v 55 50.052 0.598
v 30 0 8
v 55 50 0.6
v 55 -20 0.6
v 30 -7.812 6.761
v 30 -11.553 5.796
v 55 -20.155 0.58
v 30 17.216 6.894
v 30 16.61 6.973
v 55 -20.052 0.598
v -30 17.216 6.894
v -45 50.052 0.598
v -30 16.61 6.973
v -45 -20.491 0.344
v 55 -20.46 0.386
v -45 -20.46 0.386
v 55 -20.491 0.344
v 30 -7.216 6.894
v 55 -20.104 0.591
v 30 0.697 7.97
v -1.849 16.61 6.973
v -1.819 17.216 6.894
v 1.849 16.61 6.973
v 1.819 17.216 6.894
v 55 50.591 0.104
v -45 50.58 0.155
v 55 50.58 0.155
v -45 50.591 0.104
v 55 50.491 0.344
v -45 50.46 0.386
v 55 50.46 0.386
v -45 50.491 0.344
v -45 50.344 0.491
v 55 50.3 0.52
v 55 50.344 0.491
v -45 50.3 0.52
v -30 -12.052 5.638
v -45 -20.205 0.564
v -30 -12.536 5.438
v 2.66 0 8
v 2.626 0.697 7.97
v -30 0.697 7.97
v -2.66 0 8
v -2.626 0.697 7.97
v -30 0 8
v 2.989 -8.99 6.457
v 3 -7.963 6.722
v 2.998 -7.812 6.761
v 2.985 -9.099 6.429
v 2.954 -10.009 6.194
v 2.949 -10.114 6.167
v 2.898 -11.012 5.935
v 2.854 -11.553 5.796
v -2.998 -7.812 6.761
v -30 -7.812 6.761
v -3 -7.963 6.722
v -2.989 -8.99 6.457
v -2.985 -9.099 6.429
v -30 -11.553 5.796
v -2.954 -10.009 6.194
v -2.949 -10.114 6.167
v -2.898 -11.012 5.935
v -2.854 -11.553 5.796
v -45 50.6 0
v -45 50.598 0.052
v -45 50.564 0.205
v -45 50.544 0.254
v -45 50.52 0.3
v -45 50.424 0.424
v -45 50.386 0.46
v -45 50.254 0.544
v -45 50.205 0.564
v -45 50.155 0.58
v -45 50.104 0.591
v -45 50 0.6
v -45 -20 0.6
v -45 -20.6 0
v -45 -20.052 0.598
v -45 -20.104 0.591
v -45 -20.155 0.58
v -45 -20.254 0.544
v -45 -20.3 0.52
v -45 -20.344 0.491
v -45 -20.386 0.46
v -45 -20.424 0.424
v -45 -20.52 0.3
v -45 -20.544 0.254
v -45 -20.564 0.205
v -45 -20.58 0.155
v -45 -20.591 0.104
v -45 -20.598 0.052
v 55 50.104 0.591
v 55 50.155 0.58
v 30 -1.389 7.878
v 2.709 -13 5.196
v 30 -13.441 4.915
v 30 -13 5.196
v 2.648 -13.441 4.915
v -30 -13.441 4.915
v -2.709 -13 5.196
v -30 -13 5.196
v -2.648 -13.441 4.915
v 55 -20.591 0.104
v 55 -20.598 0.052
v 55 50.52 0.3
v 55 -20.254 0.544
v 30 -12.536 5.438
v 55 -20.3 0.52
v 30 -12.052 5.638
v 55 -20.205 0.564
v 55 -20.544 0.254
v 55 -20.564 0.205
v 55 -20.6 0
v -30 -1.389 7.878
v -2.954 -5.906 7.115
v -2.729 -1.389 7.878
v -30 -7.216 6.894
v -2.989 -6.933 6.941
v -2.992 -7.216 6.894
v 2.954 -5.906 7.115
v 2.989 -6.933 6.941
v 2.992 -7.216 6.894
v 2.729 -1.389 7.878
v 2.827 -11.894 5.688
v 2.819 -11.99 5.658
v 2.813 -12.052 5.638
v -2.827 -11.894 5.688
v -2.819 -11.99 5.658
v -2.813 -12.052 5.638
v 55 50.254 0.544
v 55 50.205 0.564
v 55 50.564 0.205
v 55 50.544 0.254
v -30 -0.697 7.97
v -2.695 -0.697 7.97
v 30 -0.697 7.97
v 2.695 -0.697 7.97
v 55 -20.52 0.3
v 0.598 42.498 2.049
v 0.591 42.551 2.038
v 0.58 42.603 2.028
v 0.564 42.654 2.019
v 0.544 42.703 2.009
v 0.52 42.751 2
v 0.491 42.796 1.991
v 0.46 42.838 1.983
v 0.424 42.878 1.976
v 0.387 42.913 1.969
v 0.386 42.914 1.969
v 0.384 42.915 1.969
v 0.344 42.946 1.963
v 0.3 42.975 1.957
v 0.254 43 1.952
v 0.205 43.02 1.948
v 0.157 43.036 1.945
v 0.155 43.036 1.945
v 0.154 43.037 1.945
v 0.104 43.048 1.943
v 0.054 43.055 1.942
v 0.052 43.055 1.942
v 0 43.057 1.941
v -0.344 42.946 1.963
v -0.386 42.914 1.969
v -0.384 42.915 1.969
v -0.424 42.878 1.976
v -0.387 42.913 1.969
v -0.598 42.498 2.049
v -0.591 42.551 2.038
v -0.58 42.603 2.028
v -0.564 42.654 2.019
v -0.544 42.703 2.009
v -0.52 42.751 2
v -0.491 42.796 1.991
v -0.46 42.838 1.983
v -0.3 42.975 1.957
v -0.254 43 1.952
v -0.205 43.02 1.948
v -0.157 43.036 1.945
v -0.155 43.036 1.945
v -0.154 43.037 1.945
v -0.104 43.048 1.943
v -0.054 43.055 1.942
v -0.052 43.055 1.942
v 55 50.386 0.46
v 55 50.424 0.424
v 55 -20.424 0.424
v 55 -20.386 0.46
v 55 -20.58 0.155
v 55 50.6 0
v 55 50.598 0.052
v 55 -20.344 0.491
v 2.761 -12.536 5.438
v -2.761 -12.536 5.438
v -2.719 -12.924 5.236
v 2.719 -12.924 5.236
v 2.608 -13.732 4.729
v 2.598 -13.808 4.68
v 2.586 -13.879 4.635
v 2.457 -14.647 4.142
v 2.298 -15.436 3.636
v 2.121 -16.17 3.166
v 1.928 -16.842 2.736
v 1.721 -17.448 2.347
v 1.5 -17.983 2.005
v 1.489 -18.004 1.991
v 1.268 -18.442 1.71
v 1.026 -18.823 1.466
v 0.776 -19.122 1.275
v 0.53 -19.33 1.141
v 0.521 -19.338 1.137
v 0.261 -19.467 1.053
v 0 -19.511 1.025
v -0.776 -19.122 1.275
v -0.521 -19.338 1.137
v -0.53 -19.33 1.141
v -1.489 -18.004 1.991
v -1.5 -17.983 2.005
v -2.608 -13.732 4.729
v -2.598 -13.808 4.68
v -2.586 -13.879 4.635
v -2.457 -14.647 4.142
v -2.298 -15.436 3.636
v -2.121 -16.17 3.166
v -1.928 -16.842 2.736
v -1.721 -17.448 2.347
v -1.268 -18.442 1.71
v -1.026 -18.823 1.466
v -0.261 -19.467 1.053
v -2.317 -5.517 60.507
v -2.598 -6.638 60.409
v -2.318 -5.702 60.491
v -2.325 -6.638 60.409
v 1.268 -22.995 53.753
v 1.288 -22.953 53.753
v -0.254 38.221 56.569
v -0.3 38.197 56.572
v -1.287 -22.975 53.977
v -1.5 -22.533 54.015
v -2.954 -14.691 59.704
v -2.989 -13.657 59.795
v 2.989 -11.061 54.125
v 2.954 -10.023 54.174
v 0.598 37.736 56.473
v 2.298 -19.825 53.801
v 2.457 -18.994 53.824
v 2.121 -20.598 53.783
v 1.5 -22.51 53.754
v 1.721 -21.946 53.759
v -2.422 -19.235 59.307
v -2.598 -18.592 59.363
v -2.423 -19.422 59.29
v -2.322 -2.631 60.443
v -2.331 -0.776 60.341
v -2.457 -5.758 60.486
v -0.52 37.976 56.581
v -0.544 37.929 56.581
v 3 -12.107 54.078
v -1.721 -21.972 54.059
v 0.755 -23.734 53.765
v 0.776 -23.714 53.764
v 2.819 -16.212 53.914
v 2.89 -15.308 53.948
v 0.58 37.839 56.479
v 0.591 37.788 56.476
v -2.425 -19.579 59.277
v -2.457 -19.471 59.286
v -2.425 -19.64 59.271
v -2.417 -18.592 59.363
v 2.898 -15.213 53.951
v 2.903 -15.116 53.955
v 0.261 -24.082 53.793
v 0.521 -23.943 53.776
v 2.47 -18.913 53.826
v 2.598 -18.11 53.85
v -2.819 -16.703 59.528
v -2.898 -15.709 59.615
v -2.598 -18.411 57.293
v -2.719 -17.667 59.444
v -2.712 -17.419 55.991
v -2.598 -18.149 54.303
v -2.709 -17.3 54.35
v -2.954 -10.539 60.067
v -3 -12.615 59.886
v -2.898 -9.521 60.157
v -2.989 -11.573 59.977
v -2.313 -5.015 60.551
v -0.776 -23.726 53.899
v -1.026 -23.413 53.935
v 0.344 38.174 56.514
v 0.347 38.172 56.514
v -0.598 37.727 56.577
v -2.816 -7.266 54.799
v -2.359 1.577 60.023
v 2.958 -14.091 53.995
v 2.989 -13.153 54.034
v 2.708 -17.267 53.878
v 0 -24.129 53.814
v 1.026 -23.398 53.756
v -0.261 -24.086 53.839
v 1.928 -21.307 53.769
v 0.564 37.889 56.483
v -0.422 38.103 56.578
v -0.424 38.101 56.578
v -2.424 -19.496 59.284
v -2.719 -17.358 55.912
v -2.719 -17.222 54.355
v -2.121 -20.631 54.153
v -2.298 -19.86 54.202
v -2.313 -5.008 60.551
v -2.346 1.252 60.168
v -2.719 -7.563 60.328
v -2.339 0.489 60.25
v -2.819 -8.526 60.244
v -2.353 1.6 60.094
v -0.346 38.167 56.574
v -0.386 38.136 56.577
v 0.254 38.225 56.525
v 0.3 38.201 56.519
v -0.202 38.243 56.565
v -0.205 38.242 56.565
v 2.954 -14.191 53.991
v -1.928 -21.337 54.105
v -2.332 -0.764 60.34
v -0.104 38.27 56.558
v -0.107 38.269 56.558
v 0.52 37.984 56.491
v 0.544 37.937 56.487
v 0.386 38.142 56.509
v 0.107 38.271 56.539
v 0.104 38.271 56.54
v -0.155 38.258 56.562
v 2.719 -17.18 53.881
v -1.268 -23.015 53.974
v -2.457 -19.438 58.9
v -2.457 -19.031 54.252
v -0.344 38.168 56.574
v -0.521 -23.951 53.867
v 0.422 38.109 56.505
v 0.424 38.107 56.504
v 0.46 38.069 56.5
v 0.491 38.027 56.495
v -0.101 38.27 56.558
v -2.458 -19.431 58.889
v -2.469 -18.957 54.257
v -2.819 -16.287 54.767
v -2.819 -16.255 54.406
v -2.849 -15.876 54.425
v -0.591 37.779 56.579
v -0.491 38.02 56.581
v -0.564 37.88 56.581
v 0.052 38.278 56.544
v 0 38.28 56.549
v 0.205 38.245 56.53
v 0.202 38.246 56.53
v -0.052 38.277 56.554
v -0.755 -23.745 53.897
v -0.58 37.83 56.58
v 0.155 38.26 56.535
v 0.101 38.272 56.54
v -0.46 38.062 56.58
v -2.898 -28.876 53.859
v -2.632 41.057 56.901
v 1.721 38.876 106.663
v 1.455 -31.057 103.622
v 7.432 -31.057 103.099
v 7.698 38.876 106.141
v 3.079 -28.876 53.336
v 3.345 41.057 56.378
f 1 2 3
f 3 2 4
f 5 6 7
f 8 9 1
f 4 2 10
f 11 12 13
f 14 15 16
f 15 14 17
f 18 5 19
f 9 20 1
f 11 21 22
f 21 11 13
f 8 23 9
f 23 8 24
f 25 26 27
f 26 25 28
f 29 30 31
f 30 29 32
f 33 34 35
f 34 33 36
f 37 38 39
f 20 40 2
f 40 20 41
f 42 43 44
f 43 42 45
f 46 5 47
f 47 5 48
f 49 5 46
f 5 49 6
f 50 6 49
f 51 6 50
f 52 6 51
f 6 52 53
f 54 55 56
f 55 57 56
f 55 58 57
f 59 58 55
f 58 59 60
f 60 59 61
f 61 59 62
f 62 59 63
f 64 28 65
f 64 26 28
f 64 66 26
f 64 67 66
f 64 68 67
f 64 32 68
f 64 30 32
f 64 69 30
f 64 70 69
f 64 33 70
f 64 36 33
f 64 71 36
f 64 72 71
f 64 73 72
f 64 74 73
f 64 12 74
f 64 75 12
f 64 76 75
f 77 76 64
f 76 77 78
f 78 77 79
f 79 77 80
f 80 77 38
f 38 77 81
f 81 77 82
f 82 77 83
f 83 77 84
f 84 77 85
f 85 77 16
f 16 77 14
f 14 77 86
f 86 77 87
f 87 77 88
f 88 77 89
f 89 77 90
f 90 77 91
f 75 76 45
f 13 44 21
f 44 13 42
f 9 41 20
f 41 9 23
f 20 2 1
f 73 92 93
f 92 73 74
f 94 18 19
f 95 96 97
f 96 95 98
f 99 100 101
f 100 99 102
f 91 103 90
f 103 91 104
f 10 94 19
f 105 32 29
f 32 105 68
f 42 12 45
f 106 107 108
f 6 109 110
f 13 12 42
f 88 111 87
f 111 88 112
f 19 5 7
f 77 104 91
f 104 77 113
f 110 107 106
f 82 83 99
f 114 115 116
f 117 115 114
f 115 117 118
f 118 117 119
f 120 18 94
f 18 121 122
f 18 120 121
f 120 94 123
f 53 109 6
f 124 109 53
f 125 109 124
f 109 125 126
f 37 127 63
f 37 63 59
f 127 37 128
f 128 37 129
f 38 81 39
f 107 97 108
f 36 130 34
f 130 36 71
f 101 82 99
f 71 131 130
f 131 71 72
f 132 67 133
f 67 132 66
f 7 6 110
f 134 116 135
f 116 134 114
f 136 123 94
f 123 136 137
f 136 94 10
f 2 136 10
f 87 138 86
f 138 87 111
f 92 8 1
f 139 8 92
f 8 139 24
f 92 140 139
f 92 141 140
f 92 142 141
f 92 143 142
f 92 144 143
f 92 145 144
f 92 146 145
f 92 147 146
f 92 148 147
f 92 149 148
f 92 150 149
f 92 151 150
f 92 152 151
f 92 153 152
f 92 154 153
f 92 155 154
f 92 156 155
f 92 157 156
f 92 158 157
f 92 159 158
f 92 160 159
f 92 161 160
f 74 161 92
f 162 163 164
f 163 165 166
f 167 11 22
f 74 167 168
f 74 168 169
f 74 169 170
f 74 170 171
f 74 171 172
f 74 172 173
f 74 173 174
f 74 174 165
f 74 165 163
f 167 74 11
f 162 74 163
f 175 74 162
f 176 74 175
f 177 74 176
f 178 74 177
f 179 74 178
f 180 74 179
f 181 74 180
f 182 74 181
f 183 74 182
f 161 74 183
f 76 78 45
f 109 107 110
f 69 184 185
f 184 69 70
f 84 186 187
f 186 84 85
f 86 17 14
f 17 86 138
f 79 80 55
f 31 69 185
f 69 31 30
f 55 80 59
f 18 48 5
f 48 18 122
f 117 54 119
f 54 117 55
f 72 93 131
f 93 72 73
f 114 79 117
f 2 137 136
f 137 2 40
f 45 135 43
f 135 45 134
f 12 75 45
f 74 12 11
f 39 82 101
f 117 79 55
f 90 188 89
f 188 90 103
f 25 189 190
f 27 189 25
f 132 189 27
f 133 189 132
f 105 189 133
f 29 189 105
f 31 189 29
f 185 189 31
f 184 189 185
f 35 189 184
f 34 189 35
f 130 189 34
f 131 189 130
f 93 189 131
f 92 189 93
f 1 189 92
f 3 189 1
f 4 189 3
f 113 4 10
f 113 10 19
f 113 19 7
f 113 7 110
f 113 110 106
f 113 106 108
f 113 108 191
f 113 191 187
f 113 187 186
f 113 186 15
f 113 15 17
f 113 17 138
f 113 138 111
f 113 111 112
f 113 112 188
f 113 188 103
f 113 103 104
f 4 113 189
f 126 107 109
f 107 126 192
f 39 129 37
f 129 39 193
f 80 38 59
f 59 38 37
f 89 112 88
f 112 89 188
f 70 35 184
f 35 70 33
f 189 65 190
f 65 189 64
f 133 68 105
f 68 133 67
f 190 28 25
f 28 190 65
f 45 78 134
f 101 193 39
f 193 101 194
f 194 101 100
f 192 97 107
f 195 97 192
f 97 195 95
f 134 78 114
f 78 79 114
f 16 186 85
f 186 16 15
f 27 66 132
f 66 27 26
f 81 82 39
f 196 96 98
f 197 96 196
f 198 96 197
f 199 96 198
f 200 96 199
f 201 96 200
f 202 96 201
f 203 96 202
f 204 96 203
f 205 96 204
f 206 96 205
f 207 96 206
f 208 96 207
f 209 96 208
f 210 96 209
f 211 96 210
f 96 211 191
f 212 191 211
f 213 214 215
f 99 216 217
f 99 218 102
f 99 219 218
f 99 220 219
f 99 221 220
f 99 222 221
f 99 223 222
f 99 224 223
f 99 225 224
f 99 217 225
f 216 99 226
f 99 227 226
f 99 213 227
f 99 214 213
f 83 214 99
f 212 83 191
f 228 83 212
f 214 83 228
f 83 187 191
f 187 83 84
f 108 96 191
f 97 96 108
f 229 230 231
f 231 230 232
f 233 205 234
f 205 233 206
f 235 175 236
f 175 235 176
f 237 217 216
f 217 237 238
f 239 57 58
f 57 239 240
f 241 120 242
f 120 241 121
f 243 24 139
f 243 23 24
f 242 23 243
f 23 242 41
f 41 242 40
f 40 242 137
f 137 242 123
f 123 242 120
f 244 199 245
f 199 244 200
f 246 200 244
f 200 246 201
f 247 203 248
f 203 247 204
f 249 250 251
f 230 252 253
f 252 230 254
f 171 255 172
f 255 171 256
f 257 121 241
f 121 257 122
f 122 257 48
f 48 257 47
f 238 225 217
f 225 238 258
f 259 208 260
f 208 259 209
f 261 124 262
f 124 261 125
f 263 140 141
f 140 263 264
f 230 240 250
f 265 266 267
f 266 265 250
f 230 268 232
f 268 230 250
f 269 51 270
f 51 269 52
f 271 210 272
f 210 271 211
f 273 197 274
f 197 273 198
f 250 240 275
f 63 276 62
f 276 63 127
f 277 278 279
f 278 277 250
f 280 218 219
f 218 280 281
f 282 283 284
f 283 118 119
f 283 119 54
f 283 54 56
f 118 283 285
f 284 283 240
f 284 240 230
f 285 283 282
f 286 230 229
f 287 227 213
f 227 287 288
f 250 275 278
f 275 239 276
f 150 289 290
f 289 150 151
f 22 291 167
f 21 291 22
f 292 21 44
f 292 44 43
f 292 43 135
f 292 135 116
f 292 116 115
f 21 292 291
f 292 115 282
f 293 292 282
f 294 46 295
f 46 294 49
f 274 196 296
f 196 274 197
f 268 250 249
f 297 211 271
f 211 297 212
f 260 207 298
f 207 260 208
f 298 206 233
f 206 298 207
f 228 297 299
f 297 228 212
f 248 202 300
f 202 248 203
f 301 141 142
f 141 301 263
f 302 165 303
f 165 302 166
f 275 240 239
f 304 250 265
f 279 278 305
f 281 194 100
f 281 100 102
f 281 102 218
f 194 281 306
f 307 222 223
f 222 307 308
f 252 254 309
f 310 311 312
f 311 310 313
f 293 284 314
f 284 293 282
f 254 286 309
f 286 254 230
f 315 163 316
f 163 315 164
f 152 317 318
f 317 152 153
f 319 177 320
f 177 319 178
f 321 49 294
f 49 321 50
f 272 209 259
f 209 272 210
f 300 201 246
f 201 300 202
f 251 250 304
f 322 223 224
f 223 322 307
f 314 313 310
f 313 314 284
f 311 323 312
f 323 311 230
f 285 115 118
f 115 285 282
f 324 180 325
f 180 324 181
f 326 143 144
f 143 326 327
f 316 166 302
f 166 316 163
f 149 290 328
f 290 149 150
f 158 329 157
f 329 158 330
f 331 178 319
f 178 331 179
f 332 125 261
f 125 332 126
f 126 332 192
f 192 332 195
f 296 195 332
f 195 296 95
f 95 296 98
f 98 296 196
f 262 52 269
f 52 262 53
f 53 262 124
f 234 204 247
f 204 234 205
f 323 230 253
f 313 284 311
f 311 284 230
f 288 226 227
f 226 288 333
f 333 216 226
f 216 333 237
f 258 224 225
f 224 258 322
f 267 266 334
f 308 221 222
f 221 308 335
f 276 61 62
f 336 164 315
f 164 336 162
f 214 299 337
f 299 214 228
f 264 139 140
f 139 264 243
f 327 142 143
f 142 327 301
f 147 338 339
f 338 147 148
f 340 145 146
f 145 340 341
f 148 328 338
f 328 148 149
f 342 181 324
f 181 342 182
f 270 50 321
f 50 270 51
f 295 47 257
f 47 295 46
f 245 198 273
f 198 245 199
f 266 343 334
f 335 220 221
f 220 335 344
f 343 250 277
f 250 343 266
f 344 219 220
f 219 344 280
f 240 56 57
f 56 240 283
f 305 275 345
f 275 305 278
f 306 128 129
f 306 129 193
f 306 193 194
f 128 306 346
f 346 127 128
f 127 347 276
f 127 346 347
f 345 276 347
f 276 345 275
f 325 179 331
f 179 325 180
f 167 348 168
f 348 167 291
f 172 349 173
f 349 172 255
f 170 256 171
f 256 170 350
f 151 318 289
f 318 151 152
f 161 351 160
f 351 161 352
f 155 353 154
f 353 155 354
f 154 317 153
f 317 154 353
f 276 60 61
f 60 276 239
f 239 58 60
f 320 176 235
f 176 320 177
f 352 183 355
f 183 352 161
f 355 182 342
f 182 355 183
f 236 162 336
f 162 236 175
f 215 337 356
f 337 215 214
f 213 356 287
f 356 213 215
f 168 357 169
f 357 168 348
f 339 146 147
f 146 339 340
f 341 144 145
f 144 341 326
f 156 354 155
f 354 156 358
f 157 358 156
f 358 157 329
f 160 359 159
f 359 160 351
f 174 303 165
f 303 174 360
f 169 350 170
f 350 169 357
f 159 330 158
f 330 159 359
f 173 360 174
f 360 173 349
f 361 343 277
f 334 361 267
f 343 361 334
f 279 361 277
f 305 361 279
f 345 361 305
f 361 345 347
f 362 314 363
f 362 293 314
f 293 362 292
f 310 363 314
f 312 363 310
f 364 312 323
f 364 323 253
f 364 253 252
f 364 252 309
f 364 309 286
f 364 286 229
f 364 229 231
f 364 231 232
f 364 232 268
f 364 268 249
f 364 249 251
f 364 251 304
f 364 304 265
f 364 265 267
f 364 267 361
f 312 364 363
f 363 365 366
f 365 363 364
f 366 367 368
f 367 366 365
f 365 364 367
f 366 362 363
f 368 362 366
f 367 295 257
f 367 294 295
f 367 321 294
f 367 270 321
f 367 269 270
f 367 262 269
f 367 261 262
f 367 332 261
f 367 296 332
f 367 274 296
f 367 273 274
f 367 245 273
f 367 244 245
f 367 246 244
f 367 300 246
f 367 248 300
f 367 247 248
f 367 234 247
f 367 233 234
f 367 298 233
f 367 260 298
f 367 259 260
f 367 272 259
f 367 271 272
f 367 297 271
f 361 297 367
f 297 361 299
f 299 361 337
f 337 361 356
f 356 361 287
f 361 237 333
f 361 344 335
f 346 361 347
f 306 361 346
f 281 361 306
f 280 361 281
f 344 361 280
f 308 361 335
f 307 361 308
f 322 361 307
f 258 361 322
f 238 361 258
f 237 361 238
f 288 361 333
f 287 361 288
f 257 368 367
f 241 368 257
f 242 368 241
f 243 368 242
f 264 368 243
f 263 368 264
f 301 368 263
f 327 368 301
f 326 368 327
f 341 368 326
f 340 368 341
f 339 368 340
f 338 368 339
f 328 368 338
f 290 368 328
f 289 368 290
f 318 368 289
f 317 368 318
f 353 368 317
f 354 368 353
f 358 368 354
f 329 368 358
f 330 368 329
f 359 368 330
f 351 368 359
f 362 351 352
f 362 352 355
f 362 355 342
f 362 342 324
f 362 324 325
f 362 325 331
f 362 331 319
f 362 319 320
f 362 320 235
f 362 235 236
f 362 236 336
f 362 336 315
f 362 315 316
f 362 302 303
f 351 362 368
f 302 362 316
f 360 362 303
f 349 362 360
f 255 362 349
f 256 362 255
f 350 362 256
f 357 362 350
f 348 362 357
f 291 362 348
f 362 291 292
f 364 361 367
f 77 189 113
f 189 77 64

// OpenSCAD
//T foil
$fn=72;
module tfoil(){
    difference(){
        union(){
            hull(){
                translate([0,0,0])
                    rotate([0,90,0])
                        cylinder(r=8,h=60,center=true);
                translate([0,-6,0])
                    rotate([0,90,0])
                        cylinder(r=7,h=60,center=true);
                translate([0,16,0])
                    rotate([0,90,0])
                        cylinder(r=7,h=60,center=true);
                translate([0,-10,0])
                    rotate([0,90,0])
                        cylinder(r=6,h=60,center=true);
                translate([5,50,0])
                    rotate([0,90,0])
                        cylinder(r=0.6,h=100,center=true);
                translate([5,-20,0])
                    rotate([0,90,0])
                        cylinder(r=0.6,h=100,center=true);
            };
            hull(){
                translate([0,-10,30])
                    rotate([5,0,0])
                        scale([1,4,1])
                            cylinder(r=3,h=60,center=true);
                translate([0,40,30])
                    rotate([5,0,0])
                        cylinder(r=0.6,h=60,center=true);
            };
            translate([2.4,5,80])
                rotate([2.5,5,0])
                    cube([6,70,50],center=true);
        };
        translate([0,0,-20])
            cube([400,400,40],center=true);
    };
}
tfoil();
